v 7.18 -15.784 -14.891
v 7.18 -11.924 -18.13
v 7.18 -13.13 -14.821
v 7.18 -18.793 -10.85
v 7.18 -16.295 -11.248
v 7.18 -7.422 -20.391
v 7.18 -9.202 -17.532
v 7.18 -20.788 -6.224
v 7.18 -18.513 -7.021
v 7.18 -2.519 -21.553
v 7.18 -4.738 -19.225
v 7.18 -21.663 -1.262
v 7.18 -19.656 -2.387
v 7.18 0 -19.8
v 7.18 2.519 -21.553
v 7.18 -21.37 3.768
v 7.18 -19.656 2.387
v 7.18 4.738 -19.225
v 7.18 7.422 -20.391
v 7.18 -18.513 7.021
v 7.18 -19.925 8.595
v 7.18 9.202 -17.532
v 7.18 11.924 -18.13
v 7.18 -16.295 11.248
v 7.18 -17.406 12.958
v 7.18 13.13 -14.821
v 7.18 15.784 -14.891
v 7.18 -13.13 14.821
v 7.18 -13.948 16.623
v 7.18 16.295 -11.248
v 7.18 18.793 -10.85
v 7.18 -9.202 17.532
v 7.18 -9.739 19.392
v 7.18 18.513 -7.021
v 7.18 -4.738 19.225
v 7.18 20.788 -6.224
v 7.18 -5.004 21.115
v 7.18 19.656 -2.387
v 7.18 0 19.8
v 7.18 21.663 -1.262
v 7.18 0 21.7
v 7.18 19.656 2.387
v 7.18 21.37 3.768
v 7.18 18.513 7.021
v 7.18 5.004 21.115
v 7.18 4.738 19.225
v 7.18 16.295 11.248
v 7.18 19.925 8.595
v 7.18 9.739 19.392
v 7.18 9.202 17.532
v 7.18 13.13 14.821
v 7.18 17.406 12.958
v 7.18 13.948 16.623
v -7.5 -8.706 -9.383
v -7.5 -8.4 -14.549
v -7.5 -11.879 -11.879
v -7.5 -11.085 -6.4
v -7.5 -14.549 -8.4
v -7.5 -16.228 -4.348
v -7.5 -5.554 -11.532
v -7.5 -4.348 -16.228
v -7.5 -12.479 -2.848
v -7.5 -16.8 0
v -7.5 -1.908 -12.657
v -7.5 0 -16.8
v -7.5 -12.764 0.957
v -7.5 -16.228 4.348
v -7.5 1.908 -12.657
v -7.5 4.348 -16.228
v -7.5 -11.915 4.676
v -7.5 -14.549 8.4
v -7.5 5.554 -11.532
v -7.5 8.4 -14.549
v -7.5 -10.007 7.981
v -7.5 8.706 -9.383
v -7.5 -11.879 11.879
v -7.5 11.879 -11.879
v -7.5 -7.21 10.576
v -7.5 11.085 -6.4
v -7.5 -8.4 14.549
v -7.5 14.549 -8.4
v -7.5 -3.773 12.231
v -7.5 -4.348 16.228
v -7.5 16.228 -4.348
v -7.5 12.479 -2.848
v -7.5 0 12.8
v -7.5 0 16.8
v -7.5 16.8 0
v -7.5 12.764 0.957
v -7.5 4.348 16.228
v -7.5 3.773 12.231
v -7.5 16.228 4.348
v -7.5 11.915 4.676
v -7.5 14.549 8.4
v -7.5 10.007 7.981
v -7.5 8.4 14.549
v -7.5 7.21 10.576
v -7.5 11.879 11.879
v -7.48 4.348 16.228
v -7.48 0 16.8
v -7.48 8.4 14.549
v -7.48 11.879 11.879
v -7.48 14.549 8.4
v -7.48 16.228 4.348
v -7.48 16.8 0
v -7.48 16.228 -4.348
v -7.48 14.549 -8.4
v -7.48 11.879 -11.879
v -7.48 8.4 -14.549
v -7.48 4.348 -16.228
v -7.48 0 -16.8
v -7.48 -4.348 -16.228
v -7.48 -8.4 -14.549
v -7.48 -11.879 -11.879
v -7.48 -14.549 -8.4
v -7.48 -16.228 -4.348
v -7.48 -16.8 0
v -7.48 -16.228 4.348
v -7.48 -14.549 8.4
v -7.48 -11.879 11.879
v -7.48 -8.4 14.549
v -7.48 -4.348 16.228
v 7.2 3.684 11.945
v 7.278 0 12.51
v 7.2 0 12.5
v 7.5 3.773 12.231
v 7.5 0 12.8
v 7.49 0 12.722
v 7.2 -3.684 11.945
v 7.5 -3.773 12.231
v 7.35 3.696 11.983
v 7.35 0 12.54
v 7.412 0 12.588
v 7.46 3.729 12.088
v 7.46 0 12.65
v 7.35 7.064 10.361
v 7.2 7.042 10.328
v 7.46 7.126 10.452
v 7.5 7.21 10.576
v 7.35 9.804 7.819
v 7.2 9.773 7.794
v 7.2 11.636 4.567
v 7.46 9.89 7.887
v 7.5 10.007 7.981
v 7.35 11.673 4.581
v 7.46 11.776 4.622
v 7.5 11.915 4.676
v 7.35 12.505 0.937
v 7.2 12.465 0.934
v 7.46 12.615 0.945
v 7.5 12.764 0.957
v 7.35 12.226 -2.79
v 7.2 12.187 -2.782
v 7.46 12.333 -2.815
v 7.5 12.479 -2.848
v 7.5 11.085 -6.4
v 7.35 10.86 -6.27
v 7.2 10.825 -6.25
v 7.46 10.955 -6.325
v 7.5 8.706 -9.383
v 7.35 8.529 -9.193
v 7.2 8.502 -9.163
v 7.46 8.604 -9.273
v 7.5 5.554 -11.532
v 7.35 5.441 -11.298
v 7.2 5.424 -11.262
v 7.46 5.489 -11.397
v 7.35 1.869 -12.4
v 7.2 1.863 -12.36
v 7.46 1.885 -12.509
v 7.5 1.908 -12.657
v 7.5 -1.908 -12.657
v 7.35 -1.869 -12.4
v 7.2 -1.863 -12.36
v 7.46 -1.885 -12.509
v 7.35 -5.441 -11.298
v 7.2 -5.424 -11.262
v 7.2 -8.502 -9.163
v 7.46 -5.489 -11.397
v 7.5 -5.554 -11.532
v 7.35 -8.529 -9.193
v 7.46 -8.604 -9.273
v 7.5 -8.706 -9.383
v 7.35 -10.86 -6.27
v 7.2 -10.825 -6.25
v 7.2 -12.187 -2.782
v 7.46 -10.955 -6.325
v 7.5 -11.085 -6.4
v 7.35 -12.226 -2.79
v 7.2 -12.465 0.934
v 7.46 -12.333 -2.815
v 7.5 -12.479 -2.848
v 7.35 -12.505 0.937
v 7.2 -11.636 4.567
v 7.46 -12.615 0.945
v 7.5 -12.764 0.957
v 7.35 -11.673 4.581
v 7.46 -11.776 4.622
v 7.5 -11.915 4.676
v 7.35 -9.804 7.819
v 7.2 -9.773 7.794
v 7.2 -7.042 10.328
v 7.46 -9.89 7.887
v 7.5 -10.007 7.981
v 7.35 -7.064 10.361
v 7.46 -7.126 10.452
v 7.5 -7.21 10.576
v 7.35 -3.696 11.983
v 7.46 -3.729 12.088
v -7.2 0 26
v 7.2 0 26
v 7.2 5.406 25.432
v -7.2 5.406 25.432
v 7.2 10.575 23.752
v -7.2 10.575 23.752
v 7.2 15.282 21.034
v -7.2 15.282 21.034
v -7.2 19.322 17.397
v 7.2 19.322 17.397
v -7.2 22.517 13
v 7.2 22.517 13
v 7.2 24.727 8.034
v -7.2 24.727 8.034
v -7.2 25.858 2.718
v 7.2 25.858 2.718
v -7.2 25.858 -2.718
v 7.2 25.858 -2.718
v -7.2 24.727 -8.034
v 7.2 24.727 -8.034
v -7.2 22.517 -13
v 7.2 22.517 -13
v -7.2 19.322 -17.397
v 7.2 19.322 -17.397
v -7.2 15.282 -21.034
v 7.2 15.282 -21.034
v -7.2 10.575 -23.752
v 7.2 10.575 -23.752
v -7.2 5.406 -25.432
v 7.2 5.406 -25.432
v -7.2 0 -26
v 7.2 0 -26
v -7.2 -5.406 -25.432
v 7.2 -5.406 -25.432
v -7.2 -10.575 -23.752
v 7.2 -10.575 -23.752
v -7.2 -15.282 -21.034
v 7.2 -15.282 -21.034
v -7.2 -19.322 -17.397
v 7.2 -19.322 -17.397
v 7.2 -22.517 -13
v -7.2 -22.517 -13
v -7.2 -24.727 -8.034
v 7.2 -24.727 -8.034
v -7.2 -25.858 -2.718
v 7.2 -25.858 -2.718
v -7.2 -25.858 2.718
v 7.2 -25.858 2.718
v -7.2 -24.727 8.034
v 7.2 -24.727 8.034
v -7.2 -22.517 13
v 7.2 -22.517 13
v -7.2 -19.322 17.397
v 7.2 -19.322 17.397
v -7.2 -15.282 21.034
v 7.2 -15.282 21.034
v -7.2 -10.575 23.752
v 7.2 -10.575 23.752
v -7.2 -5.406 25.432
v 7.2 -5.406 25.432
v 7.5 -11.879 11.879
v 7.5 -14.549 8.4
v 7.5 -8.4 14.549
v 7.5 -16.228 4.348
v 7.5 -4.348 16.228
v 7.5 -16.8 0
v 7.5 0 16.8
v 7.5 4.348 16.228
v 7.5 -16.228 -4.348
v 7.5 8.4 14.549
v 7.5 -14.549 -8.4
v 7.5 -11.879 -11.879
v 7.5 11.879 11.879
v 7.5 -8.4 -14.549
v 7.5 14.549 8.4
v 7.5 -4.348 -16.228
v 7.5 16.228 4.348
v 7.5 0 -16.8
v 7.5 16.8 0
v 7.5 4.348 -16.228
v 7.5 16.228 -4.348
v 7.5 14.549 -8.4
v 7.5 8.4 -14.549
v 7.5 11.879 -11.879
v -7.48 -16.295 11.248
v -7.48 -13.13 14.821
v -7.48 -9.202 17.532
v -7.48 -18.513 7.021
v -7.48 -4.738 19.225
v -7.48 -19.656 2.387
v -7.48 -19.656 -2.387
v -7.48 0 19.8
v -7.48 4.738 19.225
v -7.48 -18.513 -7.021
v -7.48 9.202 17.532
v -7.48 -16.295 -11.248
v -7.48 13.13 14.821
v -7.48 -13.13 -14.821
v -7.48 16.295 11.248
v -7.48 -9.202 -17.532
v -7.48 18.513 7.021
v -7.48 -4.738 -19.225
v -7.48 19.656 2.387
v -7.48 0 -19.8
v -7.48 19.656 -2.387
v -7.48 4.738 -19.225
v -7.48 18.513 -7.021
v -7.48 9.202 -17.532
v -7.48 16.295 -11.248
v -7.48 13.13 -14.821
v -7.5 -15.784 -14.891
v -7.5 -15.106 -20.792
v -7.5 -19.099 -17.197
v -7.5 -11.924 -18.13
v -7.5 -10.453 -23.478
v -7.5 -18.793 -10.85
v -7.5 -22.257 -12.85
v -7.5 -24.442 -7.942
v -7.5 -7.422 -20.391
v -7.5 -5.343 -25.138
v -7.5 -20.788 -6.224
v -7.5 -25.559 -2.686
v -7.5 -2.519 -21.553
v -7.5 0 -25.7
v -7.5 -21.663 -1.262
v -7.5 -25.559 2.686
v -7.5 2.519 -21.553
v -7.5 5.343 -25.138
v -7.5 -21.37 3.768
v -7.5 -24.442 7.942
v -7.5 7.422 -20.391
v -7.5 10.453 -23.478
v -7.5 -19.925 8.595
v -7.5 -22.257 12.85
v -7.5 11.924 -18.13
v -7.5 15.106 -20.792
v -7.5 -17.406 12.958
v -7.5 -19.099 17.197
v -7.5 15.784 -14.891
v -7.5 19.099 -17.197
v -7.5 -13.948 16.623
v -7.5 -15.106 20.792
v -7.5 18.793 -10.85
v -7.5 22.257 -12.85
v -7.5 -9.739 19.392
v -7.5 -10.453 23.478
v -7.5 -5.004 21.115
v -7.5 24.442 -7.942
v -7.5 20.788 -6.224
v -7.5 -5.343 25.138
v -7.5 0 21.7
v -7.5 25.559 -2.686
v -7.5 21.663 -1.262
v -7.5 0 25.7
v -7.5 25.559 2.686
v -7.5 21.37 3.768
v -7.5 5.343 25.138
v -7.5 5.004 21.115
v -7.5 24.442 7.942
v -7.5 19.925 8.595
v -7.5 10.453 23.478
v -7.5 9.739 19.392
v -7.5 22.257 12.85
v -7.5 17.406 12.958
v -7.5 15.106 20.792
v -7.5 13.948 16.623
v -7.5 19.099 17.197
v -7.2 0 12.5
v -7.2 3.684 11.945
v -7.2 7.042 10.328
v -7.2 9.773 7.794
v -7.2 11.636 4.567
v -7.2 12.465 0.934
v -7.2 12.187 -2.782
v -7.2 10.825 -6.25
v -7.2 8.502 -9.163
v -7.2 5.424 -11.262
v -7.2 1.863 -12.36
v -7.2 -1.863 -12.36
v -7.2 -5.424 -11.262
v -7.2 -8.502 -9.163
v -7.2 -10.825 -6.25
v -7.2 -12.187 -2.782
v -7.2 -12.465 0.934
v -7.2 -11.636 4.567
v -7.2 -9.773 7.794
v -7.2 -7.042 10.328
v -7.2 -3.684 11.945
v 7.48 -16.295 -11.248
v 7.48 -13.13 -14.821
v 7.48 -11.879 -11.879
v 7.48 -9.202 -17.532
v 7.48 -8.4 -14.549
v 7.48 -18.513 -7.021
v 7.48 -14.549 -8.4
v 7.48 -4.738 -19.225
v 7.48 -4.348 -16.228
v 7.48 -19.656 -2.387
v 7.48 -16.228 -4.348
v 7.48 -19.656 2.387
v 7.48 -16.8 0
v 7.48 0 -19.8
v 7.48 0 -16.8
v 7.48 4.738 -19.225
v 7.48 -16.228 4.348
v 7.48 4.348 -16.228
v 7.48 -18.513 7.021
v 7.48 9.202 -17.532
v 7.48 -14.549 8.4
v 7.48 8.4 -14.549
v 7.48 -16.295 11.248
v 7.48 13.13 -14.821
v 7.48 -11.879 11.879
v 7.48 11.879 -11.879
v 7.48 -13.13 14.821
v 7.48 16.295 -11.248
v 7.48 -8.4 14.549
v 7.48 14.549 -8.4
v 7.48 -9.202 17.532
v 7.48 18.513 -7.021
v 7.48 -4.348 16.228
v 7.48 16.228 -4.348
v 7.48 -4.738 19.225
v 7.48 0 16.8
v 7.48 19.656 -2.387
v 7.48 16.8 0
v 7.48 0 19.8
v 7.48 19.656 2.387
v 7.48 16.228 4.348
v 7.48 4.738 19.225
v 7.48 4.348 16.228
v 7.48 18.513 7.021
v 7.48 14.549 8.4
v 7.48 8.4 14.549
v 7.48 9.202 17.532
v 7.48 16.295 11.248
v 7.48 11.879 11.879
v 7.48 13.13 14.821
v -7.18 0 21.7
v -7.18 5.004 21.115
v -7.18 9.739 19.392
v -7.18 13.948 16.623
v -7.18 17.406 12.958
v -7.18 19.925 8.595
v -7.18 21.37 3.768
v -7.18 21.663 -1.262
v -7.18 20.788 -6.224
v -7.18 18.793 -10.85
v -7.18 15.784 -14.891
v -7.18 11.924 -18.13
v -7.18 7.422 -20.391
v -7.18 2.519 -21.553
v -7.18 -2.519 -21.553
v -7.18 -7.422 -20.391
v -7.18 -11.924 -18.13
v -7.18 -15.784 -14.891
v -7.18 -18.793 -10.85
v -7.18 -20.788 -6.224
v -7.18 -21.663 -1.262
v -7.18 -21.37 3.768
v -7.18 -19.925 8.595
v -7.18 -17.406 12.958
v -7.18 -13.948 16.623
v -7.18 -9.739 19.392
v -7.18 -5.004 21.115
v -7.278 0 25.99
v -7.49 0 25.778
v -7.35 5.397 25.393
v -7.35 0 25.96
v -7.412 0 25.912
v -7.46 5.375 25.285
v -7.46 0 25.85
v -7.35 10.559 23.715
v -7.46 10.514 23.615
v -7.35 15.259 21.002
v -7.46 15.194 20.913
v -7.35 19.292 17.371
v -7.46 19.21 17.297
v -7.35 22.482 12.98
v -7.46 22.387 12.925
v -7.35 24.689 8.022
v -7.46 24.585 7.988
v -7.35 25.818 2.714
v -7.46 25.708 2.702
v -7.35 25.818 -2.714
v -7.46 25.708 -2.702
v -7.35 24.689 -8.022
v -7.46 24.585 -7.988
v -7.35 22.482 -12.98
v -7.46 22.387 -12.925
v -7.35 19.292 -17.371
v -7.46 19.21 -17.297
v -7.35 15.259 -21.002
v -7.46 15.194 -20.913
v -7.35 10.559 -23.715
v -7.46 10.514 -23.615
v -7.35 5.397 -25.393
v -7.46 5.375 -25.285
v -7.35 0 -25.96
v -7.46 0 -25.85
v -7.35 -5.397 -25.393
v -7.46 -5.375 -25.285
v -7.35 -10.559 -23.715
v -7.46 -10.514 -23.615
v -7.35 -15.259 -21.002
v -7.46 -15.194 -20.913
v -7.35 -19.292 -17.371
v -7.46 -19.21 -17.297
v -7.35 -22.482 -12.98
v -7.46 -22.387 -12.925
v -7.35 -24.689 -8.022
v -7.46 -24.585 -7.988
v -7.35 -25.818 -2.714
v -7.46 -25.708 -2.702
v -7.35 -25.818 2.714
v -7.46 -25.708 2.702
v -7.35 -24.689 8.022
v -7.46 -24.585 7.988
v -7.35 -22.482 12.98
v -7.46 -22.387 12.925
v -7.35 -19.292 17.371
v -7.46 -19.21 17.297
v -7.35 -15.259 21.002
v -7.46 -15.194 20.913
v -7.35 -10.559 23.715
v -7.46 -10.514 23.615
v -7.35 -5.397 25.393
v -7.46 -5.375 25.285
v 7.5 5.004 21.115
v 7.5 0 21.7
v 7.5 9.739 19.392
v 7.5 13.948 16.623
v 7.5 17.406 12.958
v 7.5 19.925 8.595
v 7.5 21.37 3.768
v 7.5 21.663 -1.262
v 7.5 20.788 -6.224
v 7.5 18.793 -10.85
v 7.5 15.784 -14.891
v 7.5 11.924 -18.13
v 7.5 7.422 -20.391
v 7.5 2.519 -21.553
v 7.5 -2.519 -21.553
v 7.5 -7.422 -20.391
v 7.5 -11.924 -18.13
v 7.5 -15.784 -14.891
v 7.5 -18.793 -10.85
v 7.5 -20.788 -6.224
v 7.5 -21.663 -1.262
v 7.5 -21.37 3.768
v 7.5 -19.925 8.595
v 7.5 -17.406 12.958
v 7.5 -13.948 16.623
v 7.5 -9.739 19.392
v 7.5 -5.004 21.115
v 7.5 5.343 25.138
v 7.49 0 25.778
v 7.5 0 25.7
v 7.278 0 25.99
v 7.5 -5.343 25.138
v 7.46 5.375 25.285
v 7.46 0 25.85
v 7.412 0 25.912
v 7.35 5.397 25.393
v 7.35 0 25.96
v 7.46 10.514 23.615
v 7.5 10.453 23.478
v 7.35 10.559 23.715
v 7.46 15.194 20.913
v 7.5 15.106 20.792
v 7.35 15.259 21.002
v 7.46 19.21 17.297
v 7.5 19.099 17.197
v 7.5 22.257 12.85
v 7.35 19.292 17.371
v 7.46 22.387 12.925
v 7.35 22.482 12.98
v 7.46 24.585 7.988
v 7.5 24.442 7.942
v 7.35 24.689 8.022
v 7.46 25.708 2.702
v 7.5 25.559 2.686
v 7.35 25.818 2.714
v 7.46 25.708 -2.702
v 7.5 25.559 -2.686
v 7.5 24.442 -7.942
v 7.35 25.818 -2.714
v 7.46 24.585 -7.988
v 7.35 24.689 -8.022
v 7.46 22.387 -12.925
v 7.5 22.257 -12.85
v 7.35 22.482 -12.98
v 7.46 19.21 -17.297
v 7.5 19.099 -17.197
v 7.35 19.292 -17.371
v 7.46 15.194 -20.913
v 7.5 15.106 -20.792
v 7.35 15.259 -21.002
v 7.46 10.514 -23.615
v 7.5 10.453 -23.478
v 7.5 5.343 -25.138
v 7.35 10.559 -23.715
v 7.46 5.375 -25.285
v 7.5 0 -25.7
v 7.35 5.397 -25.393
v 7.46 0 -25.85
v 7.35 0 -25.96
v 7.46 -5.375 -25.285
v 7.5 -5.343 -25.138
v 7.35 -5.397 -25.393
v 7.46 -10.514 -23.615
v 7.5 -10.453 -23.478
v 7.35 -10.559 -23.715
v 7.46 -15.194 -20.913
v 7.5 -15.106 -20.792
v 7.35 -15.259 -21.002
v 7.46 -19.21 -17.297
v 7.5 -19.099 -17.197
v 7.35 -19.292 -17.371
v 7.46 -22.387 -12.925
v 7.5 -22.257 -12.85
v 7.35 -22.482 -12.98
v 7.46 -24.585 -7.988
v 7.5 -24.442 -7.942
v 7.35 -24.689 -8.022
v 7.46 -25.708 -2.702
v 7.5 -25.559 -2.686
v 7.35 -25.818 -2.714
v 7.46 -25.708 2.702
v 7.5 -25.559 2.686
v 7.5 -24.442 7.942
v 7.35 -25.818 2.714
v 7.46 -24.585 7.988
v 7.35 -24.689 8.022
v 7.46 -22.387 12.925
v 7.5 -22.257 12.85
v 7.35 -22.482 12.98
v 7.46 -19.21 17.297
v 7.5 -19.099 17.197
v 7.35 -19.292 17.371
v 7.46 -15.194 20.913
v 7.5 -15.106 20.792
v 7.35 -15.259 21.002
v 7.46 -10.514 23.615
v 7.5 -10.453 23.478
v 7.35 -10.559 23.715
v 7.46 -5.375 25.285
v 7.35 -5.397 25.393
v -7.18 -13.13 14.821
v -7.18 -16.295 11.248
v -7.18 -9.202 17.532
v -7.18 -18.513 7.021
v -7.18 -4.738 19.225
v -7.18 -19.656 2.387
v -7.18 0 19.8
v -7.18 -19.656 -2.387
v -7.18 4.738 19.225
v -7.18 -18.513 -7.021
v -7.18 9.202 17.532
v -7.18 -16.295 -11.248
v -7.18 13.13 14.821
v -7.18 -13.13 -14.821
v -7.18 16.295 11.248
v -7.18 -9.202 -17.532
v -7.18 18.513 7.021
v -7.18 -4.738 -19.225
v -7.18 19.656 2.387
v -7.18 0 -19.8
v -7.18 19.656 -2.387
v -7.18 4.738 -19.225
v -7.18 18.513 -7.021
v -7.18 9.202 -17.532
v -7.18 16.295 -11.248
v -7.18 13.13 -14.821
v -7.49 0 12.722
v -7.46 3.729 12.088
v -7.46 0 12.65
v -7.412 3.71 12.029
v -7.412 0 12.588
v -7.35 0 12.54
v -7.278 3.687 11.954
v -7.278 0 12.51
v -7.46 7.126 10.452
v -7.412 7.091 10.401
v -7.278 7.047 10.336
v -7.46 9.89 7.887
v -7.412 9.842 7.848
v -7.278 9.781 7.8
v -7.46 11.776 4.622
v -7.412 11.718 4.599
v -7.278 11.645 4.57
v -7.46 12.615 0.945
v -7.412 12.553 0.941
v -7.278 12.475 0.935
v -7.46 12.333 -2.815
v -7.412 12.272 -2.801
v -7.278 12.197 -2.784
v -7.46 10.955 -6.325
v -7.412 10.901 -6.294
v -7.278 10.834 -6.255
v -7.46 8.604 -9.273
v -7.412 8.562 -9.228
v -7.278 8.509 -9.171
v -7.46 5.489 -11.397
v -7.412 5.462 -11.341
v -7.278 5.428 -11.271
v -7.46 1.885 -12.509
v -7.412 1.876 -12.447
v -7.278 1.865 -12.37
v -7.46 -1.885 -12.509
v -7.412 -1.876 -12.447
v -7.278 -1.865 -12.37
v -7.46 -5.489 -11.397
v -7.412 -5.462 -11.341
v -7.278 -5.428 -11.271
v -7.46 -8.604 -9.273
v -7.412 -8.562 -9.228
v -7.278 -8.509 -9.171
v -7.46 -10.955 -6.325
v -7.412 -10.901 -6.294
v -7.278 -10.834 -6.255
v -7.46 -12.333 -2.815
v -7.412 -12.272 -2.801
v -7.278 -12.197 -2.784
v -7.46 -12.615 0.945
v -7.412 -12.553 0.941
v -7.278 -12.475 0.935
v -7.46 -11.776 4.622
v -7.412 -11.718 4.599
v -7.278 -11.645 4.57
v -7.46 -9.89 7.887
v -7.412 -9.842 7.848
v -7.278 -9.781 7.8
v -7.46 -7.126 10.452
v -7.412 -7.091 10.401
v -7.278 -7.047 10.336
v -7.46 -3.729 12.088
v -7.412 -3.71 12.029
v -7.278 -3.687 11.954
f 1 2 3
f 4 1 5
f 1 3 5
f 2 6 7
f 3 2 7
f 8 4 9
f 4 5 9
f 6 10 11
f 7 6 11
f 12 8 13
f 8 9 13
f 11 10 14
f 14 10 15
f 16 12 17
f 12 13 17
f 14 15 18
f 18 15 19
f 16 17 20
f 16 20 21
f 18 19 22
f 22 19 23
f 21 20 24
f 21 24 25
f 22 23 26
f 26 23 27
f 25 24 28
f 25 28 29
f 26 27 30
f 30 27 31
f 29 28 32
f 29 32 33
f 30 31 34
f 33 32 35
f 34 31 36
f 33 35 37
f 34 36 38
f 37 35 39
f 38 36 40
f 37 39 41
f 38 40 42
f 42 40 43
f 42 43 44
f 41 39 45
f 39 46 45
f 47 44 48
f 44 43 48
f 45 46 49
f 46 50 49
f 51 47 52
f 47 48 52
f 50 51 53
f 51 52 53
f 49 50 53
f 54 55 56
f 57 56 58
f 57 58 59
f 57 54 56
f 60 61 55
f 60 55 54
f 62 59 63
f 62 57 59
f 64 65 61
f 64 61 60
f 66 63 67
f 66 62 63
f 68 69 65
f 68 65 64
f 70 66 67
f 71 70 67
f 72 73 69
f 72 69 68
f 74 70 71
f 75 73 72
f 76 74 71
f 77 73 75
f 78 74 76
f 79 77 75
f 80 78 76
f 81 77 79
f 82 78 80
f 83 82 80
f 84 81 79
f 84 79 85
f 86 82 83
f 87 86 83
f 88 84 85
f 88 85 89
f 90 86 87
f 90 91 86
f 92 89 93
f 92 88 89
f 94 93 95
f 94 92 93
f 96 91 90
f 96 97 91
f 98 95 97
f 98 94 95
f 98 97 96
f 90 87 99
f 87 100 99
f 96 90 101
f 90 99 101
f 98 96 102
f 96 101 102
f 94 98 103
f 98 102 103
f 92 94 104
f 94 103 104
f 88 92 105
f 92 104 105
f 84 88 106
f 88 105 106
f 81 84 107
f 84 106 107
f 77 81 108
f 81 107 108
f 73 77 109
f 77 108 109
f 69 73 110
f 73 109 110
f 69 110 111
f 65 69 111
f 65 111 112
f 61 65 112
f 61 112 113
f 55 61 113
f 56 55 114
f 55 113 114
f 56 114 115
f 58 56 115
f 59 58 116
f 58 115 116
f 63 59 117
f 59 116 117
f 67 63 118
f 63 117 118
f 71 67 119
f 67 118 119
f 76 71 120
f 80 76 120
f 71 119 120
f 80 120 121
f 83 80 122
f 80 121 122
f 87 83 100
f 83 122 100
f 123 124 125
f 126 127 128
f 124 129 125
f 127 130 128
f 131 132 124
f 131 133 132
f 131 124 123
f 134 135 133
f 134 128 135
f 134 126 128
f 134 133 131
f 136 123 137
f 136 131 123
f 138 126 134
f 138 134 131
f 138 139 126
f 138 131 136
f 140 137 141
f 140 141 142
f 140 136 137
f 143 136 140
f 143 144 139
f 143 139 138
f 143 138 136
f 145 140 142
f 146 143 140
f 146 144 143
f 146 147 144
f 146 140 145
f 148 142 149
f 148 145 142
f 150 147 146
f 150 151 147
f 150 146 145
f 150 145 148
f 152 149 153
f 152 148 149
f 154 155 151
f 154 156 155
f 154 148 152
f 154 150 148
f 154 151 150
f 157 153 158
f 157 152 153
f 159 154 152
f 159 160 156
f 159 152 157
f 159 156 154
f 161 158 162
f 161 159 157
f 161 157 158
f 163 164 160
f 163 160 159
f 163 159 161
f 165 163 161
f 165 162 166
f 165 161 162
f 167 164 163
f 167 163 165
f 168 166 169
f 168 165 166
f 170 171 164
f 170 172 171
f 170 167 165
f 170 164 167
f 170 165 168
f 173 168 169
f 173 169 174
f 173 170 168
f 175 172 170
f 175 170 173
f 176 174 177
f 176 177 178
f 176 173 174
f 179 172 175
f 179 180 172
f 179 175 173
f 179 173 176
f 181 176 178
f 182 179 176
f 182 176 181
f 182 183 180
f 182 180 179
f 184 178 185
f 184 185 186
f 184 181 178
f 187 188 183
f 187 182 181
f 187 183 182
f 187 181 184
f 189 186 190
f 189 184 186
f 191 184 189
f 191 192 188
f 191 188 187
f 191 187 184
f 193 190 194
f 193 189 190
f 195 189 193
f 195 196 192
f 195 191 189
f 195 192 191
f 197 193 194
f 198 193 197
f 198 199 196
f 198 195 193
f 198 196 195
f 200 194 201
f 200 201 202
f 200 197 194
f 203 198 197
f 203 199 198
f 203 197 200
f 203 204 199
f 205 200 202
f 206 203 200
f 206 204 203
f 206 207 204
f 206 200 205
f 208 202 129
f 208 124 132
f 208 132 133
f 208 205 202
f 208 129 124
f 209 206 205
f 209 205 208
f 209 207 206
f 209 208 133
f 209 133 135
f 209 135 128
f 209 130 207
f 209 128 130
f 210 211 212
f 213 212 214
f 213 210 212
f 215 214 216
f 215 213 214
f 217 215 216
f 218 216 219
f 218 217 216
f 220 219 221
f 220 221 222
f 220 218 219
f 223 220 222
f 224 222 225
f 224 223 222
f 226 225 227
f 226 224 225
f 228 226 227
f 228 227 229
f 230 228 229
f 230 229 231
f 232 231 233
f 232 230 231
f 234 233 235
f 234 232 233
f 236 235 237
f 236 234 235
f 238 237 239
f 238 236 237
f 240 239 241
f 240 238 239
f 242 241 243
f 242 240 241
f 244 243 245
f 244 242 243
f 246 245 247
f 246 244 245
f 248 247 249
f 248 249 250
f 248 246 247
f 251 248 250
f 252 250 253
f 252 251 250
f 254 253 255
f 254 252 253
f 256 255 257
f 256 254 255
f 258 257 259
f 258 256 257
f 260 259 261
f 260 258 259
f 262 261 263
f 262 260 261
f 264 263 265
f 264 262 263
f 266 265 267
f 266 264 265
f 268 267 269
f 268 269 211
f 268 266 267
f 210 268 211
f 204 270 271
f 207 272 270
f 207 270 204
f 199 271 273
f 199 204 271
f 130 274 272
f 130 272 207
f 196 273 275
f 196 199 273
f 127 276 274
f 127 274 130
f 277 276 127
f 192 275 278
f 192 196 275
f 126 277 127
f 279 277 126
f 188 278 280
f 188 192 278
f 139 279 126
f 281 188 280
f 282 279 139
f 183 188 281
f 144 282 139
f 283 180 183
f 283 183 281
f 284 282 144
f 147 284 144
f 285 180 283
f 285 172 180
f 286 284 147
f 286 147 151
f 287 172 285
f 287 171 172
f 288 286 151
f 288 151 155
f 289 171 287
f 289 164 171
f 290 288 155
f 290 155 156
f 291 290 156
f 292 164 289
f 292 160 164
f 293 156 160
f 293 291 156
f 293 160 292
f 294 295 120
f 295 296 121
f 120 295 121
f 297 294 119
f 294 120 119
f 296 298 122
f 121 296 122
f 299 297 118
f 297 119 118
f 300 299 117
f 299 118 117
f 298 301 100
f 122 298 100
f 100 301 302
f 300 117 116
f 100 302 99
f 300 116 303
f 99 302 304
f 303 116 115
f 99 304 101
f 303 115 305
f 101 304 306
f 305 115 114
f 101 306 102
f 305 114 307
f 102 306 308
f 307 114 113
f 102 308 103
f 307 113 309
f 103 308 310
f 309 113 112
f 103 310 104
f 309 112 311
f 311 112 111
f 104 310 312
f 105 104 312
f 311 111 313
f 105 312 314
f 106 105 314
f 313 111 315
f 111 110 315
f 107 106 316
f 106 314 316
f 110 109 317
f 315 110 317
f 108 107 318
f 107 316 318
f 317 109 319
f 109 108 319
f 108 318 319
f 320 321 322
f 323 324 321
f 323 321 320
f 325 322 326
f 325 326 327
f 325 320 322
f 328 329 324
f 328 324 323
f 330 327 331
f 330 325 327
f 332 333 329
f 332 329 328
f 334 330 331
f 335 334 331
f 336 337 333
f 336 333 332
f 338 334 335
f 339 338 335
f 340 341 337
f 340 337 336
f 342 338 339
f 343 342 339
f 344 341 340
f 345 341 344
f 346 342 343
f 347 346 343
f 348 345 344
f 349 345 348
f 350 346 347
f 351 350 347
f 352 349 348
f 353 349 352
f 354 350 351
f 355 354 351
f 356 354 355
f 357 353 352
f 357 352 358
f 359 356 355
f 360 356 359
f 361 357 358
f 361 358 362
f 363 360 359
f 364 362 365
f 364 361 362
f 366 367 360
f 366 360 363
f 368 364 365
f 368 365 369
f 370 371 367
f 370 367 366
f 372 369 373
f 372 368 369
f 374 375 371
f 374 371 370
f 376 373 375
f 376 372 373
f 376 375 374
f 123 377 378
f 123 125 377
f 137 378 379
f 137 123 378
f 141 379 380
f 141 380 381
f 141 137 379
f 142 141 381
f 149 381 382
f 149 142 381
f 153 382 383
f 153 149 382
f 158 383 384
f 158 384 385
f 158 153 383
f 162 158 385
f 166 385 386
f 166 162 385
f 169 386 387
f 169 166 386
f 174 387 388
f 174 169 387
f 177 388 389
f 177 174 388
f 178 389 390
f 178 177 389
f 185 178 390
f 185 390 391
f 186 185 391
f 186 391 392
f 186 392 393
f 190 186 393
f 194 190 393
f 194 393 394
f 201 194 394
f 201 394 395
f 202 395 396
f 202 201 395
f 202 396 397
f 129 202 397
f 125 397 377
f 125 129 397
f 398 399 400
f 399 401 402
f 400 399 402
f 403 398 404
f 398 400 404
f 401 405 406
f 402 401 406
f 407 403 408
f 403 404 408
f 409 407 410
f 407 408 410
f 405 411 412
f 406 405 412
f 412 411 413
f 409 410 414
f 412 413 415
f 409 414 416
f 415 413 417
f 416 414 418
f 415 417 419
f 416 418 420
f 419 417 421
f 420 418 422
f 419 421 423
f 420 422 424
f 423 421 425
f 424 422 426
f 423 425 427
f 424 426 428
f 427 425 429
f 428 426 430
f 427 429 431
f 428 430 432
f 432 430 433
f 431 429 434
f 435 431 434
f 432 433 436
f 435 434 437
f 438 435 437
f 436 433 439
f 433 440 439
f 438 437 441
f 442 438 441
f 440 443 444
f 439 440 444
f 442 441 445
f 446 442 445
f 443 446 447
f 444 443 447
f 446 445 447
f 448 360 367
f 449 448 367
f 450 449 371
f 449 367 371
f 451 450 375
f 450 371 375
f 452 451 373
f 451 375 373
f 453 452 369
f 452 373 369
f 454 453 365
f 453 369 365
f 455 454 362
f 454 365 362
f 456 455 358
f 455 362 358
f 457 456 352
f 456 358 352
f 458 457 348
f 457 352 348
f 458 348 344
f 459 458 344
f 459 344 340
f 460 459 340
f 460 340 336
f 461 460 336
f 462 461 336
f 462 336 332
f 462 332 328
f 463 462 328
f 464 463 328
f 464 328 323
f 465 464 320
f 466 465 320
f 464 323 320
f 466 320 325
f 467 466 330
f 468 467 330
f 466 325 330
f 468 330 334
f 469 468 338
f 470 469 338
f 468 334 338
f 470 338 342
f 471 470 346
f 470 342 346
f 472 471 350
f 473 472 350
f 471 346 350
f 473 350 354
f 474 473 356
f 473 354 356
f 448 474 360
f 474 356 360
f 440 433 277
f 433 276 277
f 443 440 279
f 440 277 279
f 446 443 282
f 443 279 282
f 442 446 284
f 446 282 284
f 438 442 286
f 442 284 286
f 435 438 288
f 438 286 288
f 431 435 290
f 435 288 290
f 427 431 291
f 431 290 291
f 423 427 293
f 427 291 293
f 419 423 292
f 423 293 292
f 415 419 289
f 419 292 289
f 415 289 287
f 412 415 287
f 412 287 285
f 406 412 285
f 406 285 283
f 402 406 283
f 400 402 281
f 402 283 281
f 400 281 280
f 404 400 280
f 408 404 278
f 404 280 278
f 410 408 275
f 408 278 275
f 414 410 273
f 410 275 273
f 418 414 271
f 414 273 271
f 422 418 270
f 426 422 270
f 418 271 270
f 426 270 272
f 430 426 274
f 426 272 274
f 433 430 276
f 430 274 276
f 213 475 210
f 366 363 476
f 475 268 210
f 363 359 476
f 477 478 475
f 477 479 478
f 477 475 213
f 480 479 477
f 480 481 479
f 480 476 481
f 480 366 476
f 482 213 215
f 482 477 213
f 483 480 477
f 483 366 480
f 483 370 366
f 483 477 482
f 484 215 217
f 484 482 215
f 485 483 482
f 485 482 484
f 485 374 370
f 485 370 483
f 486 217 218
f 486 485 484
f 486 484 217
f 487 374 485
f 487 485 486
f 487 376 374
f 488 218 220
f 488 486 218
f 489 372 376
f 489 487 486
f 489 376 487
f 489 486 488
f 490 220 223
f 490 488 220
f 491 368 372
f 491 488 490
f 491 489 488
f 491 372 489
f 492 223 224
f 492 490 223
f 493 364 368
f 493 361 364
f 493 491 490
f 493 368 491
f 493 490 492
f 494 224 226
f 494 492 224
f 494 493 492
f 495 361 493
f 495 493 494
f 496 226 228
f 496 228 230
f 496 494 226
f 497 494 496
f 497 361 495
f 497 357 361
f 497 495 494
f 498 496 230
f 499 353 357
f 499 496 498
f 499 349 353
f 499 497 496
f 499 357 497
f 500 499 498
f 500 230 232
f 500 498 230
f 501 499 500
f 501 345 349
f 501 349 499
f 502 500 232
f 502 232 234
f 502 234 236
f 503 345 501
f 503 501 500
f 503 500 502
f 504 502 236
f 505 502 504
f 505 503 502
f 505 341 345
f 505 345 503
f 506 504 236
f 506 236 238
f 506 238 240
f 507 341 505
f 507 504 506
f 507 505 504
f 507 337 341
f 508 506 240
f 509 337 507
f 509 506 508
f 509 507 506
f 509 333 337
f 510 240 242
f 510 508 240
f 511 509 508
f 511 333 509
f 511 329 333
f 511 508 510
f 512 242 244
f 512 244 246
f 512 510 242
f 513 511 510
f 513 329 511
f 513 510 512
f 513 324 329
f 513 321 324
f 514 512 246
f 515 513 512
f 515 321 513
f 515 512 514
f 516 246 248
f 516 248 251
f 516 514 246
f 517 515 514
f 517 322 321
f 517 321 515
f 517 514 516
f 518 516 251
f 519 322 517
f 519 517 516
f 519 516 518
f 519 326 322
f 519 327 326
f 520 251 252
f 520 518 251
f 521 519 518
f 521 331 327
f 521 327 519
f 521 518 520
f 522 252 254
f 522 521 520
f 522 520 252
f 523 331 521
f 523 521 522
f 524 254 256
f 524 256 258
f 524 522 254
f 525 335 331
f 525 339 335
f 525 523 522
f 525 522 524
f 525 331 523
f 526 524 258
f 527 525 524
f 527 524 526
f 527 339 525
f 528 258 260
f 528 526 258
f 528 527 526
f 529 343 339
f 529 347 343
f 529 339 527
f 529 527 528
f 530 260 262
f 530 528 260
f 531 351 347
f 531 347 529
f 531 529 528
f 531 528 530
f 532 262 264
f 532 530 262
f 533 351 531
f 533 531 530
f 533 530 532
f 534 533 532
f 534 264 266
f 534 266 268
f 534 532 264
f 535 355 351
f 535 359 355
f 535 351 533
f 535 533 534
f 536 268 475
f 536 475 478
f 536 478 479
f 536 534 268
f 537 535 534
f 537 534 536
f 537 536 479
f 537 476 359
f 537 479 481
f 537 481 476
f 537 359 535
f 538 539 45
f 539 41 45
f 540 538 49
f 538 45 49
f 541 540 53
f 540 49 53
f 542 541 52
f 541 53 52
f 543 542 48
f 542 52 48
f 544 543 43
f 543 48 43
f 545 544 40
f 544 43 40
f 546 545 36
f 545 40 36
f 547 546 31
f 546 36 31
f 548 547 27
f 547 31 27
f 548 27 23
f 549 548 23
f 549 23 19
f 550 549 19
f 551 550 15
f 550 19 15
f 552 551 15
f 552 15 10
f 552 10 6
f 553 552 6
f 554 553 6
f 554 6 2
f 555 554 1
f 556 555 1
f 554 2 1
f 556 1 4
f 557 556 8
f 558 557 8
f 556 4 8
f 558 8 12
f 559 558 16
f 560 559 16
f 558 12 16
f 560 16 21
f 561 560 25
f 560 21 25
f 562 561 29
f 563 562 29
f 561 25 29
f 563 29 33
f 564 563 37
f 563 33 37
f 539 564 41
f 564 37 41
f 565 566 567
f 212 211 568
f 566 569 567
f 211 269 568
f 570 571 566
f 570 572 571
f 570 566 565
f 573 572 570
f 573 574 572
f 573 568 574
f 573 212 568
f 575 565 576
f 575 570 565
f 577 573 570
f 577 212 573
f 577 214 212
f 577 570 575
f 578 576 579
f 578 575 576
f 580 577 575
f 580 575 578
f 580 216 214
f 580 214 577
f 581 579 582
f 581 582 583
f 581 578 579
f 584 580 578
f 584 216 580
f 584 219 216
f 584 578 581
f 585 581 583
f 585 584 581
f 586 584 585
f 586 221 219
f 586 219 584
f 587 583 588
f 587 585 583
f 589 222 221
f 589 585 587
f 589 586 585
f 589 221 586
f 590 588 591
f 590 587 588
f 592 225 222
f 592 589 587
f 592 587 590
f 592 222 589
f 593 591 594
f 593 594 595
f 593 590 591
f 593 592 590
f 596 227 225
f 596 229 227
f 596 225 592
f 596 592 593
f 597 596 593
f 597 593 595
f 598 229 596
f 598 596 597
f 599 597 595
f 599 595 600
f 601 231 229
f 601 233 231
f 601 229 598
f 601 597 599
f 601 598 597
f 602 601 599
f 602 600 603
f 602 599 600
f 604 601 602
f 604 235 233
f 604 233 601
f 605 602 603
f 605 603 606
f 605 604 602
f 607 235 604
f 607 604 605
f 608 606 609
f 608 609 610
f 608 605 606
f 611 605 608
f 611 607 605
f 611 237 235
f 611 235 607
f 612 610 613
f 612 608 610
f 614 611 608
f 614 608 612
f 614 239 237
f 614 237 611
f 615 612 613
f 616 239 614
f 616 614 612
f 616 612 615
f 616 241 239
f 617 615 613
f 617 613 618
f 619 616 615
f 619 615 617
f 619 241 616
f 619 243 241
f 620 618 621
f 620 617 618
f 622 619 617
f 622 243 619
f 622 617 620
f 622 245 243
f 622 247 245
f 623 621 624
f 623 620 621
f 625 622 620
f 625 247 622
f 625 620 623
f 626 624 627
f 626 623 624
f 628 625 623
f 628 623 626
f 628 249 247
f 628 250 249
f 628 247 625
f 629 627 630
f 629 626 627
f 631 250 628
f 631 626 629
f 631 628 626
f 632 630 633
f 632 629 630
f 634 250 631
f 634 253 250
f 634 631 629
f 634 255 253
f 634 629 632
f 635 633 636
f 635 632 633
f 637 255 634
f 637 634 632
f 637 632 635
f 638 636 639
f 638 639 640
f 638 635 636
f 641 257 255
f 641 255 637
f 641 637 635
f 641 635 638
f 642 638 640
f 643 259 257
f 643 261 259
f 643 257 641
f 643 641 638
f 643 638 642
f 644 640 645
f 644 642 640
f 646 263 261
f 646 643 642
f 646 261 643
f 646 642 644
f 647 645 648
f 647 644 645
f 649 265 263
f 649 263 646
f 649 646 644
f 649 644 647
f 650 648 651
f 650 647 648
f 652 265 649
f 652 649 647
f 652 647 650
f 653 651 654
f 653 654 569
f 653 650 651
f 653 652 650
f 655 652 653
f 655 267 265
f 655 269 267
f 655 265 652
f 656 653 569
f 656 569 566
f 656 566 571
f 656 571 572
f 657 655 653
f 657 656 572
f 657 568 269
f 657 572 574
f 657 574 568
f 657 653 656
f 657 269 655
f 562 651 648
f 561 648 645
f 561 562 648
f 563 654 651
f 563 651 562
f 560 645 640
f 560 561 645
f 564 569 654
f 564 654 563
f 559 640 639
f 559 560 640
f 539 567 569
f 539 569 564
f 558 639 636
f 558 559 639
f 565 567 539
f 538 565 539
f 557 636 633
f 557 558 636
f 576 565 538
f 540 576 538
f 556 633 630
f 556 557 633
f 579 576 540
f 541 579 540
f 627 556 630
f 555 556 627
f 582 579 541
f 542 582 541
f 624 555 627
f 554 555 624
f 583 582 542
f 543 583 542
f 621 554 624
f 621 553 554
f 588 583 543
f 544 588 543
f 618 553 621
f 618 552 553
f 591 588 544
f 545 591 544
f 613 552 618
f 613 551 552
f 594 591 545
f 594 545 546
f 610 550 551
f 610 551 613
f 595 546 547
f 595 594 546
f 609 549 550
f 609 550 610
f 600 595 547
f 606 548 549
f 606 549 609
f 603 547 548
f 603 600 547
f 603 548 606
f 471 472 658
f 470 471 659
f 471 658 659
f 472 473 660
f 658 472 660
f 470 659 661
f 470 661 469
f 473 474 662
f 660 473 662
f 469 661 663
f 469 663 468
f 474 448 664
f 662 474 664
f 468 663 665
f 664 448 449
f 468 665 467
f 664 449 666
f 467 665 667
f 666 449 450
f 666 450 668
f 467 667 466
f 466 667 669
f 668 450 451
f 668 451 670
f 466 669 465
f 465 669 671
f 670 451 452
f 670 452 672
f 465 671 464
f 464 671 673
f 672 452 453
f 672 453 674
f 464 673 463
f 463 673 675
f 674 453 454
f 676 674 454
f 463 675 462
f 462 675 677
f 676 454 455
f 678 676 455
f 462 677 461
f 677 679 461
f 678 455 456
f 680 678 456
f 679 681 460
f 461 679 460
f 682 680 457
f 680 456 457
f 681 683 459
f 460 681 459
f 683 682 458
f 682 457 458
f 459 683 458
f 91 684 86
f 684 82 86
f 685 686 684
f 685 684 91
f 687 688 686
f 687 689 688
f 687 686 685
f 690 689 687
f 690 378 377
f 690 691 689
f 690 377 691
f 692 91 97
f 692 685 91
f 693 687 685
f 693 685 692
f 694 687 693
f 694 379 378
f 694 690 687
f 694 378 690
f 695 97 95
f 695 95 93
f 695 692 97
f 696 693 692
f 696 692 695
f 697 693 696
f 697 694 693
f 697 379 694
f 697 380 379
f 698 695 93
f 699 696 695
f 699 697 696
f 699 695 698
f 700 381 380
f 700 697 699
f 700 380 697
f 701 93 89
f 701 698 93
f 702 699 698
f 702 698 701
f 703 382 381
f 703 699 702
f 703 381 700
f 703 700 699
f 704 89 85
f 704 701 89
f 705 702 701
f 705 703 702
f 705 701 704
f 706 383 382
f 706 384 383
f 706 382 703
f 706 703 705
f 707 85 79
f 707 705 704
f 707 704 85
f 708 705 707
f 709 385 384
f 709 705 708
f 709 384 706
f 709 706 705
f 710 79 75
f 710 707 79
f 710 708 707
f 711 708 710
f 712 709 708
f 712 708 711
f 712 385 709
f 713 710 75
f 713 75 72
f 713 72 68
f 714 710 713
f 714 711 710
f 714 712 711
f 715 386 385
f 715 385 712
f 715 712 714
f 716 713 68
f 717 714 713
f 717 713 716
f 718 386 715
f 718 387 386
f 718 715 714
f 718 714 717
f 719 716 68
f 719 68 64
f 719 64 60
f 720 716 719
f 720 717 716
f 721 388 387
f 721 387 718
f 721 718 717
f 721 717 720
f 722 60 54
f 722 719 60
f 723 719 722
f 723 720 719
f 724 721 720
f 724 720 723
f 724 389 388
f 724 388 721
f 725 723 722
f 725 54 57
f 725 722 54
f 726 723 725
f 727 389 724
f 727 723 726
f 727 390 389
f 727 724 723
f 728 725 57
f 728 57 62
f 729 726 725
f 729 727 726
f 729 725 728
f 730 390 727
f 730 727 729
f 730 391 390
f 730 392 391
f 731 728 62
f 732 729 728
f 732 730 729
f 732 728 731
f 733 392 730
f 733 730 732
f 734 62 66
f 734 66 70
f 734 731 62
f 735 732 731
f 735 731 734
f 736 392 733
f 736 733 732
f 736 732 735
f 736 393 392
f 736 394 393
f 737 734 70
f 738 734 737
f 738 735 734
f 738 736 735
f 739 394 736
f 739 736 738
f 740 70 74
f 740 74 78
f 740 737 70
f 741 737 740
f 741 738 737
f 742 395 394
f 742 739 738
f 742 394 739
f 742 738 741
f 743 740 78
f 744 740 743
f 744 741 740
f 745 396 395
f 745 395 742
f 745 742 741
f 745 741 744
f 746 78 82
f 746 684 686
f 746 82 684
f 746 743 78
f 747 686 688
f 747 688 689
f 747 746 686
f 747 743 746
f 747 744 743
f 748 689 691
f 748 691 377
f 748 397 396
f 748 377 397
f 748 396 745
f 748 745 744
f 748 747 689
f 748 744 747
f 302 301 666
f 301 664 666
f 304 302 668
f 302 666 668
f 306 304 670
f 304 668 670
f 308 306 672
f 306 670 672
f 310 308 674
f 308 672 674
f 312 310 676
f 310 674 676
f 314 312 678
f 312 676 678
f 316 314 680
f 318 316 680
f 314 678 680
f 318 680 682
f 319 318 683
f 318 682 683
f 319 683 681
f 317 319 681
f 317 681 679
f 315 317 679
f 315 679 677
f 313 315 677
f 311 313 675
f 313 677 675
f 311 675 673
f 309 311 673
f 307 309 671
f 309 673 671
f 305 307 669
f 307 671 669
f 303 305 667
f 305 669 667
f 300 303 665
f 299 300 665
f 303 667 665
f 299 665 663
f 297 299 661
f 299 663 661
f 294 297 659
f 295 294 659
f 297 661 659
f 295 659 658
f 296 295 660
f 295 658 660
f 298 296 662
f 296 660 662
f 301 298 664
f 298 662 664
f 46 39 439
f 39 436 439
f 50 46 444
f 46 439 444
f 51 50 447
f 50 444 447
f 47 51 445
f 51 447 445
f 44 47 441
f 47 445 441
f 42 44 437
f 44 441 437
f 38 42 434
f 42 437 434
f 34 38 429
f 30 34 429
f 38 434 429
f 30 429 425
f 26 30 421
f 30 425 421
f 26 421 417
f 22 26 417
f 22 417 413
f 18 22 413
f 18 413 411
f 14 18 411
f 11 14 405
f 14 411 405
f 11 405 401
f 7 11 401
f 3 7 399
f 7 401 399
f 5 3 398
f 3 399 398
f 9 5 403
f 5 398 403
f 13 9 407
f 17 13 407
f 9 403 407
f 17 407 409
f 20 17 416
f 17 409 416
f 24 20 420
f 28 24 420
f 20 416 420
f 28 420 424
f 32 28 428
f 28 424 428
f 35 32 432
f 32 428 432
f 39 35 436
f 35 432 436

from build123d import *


with BuildPart() as part:
    # Sketch1 → Revolve1 (revolve)
    with BuildSketch(Plane.XY, mode=Mode.PRIVATE) as revolve1_sk:
        with BuildLine():
            Line((-7.2, 12.5), (7.2, 12.5))
            ThreePointArc((7.2, 12.5), (7.412132034, 12.587867966), (7.5, 12.8))
            Line((7.5, 12.8), (7.5, 25.7))
            ThreePointArc((7.5, 25.7), (7.412132034, 25.912132034), (7.2, 26))
            Line((7.2, 26), (-7.2, 26))
            ThreePointArc((-7.2, 26), (-7.412132034, 25.912132034), (-7.5, 25.7))
            Line((-7.5, 25.7), (-7.5, 12.8))
            ThreePointArc((-7.5, 12.8), (-7.412132034, 12.587867966), (-7.2, 12.5))
        make_face()
    revolve(revolve1_sk.sketch.rotate(Axis((50, 0, 0), (-1, 0, 0)), 270), axis=Axis((50, 0, 0), (-1, 0, 0)))

    # Sketch2 → Cut-Revolve1 (revolve, cut)
    with BuildSketch(Plane.XY, mode=Mode.PRIVATE) as cut_revolve1_sk:
        Polygon((-9.18, 21.7), (-9.18, 12.5), (-7.5, 12.5), (-7.5, 16.8), (-7.48, 16.8), (-7.48, 19.8), (-7.18, 19.8), (-7.18, 21.7), align=None)
    revolve(cut_revolve1_sk.sketch.rotate(Axis((50, 0, 0), (-1, 0, 0)), 270), axis=Axis((50, 0, 0), (-1, 0, 0)), mode=Mode.SUBTRACT)

    # Sketch3 → Cut-Revolve2 (revolve, cut)
    with BuildSketch(Plane.XY, mode=Mode.PRIVATE) as cut_revolve2_sk:
        Polygon((7.18, 19.8), (7.48, 19.8), (7.48, 16.8), (7.5, 16.8), (7.5, 12.5), (9.18, 12.5), (9.18, 21.7), (7.18, 21.7), align=None)
    revolve(cut_revolve2_sk.sketch.rotate(Axis((50, 0, 0), (-1, 0, 0)), 270), axis=Axis((50, 0, 0), (-1, 0, 0)), mode=Mode.SUBTRACT)


solid = part.part
